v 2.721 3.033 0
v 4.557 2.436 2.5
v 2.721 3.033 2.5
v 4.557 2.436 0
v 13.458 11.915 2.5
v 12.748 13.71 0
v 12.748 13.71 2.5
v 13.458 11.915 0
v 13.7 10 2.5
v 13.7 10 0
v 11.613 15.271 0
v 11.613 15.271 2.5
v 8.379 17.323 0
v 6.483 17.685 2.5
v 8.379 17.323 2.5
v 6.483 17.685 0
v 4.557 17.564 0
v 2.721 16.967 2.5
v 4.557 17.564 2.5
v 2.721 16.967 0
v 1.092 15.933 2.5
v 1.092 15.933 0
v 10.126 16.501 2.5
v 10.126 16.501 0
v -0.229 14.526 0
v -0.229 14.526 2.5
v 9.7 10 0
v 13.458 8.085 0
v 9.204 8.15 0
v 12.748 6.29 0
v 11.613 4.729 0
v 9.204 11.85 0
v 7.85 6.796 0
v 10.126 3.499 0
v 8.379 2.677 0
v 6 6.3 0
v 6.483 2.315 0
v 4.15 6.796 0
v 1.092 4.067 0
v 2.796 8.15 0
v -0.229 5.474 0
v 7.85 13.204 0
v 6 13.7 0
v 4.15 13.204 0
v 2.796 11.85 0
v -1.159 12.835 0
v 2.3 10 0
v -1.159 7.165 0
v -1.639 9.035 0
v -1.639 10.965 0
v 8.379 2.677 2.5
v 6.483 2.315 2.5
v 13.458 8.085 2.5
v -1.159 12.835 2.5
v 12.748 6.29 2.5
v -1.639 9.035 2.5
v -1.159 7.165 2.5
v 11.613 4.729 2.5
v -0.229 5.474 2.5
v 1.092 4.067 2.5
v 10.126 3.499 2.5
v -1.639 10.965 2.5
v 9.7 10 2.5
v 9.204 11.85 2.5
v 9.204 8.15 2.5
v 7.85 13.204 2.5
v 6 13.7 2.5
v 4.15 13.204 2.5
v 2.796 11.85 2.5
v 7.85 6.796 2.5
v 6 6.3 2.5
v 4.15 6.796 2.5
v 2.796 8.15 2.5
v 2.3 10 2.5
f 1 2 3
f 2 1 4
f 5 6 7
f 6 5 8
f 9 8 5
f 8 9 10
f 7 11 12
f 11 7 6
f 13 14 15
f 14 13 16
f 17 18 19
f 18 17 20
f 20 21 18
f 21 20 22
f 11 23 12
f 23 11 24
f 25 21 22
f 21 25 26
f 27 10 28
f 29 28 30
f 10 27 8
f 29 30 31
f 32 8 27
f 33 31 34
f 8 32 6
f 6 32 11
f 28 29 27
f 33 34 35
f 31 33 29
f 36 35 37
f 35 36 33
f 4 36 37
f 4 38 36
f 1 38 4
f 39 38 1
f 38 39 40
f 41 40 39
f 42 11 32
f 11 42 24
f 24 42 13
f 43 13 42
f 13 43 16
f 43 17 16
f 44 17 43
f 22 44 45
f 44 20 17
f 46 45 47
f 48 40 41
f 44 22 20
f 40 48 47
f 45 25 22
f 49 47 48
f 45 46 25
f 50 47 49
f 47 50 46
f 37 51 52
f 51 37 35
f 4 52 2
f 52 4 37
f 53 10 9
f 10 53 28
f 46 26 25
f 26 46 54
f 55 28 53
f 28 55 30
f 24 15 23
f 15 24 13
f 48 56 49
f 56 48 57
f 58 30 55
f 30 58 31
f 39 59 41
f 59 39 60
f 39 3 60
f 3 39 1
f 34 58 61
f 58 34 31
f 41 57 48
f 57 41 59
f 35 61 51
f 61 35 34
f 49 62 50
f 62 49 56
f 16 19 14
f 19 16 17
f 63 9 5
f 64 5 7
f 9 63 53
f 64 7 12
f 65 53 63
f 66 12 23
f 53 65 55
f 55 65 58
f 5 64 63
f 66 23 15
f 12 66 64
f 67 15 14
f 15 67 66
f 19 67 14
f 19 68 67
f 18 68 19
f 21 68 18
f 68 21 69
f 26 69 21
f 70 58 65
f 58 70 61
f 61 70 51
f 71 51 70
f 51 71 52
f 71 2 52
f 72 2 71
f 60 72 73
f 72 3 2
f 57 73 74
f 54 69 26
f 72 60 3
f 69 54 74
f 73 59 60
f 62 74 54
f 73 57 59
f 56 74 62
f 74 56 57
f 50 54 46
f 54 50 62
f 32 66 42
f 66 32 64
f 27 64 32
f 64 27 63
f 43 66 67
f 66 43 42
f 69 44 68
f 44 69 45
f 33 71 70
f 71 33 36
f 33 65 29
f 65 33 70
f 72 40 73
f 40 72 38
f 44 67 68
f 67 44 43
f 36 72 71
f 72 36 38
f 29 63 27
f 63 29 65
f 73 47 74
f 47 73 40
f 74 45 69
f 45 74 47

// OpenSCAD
halfy = 10;
extra = 0;
theheight = 2.5;

difference(){
    translate([6,0+halfy,0]) cylinder(r=7.7+extra,h=theheight);
    translate([6,0+halfy,0]) cylinder(r=3.7+extra,h=theheight);
}
